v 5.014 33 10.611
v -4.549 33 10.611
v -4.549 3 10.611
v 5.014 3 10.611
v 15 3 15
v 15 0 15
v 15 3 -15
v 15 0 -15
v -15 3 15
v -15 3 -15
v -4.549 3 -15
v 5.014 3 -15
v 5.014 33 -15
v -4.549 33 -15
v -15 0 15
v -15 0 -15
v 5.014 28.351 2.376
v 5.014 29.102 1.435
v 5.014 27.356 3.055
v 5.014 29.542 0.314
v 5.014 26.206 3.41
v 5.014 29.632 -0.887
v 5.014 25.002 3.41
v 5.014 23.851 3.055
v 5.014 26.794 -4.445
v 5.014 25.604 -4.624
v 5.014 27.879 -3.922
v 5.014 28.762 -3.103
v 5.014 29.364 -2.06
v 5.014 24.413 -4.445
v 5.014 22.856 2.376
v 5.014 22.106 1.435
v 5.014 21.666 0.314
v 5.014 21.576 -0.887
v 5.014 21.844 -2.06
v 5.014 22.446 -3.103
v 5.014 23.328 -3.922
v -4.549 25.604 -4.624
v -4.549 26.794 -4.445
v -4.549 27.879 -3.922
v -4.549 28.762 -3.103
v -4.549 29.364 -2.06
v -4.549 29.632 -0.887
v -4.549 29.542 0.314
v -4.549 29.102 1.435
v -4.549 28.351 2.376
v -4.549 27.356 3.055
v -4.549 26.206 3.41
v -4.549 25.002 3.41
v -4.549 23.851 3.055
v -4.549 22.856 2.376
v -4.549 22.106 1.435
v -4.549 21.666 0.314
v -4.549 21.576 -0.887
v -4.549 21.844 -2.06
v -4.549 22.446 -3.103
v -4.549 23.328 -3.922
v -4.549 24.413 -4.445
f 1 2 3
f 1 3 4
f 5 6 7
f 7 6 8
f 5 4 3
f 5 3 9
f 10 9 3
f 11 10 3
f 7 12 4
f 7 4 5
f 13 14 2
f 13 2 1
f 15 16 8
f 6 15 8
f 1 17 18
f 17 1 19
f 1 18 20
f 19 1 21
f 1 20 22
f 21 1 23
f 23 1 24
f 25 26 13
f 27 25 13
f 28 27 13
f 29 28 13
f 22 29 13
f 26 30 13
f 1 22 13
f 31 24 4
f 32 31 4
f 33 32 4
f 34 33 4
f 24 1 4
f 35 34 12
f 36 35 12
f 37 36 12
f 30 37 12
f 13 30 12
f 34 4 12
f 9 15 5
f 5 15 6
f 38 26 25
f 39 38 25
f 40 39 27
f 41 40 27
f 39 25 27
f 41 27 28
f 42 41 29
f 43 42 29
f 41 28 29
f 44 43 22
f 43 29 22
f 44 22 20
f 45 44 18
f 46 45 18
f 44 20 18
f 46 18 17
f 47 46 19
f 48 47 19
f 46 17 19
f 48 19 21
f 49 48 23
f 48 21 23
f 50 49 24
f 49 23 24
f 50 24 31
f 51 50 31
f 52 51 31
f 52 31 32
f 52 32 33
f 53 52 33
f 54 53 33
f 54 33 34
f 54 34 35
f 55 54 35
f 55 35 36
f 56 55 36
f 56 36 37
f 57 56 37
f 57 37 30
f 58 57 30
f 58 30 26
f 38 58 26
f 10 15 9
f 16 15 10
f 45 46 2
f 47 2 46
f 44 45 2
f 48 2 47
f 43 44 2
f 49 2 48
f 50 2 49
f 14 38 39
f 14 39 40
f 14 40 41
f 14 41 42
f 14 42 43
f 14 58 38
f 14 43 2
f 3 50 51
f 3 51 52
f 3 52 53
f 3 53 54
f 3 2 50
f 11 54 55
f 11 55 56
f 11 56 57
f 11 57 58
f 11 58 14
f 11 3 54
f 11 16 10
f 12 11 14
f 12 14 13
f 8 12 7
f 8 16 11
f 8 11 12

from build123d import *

# Parameters (mm, degrees)
CROQUIS1_W              = 30
CROQUIS1_H              = 30
SALIENTE_EXTRUIR1_DEPTH = 3
CROQUIS2_W              = 9.563107214
CROQUIS2_H              = 25.610650669
SALIENTE_EXTRUIR2_DEPTH = 30
CROQUIS3_R              = 4.0394072
CORTAR_EXTRUIR1_DEPTH   = 10


with BuildPart() as part:
    # Croquis1 → Saliente-Extruir1 (new body)
    with BuildSketch(Plane(origin=(0, 0, 0), x_dir=(1, 0, 0), z_dir=(0, 1, 0))):
        Rectangle(CROQUIS1_W, CROQUIS1_H)
    extrude(amount=SALIENTE_EXTRUIR1_DEPTH)

    # Croquis2 → Saliente-Extruir2 (add)
    with BuildSketch(Plane(origin=(0, 3, 0), x_dir=(1, 0, 0), z_dir=(0, 1, 0))):
        with Locations((0.232305854, 2.194674666)):
            Rectangle(CROQUIS2_W, CROQUIS2_H)
    extrude(amount=SALIENTE_EXTRUIR2_DEPTH)

    # Croquis3 → Cortar-Extruir1 (cut)
    with BuildSketch(Plane(origin=(5.013859461, 0, 0), x_dir=(0, 0, -1), z_dir=(1, 0, 0))):
        with Locations((0.584677198, 25.603738422)):
            Circle(CROQUIS3_R)
    extrude(amount=-CORTAR_EXTRUIR1_DEPTH, mode=Mode.SUBTRACT)


solid = part.part
